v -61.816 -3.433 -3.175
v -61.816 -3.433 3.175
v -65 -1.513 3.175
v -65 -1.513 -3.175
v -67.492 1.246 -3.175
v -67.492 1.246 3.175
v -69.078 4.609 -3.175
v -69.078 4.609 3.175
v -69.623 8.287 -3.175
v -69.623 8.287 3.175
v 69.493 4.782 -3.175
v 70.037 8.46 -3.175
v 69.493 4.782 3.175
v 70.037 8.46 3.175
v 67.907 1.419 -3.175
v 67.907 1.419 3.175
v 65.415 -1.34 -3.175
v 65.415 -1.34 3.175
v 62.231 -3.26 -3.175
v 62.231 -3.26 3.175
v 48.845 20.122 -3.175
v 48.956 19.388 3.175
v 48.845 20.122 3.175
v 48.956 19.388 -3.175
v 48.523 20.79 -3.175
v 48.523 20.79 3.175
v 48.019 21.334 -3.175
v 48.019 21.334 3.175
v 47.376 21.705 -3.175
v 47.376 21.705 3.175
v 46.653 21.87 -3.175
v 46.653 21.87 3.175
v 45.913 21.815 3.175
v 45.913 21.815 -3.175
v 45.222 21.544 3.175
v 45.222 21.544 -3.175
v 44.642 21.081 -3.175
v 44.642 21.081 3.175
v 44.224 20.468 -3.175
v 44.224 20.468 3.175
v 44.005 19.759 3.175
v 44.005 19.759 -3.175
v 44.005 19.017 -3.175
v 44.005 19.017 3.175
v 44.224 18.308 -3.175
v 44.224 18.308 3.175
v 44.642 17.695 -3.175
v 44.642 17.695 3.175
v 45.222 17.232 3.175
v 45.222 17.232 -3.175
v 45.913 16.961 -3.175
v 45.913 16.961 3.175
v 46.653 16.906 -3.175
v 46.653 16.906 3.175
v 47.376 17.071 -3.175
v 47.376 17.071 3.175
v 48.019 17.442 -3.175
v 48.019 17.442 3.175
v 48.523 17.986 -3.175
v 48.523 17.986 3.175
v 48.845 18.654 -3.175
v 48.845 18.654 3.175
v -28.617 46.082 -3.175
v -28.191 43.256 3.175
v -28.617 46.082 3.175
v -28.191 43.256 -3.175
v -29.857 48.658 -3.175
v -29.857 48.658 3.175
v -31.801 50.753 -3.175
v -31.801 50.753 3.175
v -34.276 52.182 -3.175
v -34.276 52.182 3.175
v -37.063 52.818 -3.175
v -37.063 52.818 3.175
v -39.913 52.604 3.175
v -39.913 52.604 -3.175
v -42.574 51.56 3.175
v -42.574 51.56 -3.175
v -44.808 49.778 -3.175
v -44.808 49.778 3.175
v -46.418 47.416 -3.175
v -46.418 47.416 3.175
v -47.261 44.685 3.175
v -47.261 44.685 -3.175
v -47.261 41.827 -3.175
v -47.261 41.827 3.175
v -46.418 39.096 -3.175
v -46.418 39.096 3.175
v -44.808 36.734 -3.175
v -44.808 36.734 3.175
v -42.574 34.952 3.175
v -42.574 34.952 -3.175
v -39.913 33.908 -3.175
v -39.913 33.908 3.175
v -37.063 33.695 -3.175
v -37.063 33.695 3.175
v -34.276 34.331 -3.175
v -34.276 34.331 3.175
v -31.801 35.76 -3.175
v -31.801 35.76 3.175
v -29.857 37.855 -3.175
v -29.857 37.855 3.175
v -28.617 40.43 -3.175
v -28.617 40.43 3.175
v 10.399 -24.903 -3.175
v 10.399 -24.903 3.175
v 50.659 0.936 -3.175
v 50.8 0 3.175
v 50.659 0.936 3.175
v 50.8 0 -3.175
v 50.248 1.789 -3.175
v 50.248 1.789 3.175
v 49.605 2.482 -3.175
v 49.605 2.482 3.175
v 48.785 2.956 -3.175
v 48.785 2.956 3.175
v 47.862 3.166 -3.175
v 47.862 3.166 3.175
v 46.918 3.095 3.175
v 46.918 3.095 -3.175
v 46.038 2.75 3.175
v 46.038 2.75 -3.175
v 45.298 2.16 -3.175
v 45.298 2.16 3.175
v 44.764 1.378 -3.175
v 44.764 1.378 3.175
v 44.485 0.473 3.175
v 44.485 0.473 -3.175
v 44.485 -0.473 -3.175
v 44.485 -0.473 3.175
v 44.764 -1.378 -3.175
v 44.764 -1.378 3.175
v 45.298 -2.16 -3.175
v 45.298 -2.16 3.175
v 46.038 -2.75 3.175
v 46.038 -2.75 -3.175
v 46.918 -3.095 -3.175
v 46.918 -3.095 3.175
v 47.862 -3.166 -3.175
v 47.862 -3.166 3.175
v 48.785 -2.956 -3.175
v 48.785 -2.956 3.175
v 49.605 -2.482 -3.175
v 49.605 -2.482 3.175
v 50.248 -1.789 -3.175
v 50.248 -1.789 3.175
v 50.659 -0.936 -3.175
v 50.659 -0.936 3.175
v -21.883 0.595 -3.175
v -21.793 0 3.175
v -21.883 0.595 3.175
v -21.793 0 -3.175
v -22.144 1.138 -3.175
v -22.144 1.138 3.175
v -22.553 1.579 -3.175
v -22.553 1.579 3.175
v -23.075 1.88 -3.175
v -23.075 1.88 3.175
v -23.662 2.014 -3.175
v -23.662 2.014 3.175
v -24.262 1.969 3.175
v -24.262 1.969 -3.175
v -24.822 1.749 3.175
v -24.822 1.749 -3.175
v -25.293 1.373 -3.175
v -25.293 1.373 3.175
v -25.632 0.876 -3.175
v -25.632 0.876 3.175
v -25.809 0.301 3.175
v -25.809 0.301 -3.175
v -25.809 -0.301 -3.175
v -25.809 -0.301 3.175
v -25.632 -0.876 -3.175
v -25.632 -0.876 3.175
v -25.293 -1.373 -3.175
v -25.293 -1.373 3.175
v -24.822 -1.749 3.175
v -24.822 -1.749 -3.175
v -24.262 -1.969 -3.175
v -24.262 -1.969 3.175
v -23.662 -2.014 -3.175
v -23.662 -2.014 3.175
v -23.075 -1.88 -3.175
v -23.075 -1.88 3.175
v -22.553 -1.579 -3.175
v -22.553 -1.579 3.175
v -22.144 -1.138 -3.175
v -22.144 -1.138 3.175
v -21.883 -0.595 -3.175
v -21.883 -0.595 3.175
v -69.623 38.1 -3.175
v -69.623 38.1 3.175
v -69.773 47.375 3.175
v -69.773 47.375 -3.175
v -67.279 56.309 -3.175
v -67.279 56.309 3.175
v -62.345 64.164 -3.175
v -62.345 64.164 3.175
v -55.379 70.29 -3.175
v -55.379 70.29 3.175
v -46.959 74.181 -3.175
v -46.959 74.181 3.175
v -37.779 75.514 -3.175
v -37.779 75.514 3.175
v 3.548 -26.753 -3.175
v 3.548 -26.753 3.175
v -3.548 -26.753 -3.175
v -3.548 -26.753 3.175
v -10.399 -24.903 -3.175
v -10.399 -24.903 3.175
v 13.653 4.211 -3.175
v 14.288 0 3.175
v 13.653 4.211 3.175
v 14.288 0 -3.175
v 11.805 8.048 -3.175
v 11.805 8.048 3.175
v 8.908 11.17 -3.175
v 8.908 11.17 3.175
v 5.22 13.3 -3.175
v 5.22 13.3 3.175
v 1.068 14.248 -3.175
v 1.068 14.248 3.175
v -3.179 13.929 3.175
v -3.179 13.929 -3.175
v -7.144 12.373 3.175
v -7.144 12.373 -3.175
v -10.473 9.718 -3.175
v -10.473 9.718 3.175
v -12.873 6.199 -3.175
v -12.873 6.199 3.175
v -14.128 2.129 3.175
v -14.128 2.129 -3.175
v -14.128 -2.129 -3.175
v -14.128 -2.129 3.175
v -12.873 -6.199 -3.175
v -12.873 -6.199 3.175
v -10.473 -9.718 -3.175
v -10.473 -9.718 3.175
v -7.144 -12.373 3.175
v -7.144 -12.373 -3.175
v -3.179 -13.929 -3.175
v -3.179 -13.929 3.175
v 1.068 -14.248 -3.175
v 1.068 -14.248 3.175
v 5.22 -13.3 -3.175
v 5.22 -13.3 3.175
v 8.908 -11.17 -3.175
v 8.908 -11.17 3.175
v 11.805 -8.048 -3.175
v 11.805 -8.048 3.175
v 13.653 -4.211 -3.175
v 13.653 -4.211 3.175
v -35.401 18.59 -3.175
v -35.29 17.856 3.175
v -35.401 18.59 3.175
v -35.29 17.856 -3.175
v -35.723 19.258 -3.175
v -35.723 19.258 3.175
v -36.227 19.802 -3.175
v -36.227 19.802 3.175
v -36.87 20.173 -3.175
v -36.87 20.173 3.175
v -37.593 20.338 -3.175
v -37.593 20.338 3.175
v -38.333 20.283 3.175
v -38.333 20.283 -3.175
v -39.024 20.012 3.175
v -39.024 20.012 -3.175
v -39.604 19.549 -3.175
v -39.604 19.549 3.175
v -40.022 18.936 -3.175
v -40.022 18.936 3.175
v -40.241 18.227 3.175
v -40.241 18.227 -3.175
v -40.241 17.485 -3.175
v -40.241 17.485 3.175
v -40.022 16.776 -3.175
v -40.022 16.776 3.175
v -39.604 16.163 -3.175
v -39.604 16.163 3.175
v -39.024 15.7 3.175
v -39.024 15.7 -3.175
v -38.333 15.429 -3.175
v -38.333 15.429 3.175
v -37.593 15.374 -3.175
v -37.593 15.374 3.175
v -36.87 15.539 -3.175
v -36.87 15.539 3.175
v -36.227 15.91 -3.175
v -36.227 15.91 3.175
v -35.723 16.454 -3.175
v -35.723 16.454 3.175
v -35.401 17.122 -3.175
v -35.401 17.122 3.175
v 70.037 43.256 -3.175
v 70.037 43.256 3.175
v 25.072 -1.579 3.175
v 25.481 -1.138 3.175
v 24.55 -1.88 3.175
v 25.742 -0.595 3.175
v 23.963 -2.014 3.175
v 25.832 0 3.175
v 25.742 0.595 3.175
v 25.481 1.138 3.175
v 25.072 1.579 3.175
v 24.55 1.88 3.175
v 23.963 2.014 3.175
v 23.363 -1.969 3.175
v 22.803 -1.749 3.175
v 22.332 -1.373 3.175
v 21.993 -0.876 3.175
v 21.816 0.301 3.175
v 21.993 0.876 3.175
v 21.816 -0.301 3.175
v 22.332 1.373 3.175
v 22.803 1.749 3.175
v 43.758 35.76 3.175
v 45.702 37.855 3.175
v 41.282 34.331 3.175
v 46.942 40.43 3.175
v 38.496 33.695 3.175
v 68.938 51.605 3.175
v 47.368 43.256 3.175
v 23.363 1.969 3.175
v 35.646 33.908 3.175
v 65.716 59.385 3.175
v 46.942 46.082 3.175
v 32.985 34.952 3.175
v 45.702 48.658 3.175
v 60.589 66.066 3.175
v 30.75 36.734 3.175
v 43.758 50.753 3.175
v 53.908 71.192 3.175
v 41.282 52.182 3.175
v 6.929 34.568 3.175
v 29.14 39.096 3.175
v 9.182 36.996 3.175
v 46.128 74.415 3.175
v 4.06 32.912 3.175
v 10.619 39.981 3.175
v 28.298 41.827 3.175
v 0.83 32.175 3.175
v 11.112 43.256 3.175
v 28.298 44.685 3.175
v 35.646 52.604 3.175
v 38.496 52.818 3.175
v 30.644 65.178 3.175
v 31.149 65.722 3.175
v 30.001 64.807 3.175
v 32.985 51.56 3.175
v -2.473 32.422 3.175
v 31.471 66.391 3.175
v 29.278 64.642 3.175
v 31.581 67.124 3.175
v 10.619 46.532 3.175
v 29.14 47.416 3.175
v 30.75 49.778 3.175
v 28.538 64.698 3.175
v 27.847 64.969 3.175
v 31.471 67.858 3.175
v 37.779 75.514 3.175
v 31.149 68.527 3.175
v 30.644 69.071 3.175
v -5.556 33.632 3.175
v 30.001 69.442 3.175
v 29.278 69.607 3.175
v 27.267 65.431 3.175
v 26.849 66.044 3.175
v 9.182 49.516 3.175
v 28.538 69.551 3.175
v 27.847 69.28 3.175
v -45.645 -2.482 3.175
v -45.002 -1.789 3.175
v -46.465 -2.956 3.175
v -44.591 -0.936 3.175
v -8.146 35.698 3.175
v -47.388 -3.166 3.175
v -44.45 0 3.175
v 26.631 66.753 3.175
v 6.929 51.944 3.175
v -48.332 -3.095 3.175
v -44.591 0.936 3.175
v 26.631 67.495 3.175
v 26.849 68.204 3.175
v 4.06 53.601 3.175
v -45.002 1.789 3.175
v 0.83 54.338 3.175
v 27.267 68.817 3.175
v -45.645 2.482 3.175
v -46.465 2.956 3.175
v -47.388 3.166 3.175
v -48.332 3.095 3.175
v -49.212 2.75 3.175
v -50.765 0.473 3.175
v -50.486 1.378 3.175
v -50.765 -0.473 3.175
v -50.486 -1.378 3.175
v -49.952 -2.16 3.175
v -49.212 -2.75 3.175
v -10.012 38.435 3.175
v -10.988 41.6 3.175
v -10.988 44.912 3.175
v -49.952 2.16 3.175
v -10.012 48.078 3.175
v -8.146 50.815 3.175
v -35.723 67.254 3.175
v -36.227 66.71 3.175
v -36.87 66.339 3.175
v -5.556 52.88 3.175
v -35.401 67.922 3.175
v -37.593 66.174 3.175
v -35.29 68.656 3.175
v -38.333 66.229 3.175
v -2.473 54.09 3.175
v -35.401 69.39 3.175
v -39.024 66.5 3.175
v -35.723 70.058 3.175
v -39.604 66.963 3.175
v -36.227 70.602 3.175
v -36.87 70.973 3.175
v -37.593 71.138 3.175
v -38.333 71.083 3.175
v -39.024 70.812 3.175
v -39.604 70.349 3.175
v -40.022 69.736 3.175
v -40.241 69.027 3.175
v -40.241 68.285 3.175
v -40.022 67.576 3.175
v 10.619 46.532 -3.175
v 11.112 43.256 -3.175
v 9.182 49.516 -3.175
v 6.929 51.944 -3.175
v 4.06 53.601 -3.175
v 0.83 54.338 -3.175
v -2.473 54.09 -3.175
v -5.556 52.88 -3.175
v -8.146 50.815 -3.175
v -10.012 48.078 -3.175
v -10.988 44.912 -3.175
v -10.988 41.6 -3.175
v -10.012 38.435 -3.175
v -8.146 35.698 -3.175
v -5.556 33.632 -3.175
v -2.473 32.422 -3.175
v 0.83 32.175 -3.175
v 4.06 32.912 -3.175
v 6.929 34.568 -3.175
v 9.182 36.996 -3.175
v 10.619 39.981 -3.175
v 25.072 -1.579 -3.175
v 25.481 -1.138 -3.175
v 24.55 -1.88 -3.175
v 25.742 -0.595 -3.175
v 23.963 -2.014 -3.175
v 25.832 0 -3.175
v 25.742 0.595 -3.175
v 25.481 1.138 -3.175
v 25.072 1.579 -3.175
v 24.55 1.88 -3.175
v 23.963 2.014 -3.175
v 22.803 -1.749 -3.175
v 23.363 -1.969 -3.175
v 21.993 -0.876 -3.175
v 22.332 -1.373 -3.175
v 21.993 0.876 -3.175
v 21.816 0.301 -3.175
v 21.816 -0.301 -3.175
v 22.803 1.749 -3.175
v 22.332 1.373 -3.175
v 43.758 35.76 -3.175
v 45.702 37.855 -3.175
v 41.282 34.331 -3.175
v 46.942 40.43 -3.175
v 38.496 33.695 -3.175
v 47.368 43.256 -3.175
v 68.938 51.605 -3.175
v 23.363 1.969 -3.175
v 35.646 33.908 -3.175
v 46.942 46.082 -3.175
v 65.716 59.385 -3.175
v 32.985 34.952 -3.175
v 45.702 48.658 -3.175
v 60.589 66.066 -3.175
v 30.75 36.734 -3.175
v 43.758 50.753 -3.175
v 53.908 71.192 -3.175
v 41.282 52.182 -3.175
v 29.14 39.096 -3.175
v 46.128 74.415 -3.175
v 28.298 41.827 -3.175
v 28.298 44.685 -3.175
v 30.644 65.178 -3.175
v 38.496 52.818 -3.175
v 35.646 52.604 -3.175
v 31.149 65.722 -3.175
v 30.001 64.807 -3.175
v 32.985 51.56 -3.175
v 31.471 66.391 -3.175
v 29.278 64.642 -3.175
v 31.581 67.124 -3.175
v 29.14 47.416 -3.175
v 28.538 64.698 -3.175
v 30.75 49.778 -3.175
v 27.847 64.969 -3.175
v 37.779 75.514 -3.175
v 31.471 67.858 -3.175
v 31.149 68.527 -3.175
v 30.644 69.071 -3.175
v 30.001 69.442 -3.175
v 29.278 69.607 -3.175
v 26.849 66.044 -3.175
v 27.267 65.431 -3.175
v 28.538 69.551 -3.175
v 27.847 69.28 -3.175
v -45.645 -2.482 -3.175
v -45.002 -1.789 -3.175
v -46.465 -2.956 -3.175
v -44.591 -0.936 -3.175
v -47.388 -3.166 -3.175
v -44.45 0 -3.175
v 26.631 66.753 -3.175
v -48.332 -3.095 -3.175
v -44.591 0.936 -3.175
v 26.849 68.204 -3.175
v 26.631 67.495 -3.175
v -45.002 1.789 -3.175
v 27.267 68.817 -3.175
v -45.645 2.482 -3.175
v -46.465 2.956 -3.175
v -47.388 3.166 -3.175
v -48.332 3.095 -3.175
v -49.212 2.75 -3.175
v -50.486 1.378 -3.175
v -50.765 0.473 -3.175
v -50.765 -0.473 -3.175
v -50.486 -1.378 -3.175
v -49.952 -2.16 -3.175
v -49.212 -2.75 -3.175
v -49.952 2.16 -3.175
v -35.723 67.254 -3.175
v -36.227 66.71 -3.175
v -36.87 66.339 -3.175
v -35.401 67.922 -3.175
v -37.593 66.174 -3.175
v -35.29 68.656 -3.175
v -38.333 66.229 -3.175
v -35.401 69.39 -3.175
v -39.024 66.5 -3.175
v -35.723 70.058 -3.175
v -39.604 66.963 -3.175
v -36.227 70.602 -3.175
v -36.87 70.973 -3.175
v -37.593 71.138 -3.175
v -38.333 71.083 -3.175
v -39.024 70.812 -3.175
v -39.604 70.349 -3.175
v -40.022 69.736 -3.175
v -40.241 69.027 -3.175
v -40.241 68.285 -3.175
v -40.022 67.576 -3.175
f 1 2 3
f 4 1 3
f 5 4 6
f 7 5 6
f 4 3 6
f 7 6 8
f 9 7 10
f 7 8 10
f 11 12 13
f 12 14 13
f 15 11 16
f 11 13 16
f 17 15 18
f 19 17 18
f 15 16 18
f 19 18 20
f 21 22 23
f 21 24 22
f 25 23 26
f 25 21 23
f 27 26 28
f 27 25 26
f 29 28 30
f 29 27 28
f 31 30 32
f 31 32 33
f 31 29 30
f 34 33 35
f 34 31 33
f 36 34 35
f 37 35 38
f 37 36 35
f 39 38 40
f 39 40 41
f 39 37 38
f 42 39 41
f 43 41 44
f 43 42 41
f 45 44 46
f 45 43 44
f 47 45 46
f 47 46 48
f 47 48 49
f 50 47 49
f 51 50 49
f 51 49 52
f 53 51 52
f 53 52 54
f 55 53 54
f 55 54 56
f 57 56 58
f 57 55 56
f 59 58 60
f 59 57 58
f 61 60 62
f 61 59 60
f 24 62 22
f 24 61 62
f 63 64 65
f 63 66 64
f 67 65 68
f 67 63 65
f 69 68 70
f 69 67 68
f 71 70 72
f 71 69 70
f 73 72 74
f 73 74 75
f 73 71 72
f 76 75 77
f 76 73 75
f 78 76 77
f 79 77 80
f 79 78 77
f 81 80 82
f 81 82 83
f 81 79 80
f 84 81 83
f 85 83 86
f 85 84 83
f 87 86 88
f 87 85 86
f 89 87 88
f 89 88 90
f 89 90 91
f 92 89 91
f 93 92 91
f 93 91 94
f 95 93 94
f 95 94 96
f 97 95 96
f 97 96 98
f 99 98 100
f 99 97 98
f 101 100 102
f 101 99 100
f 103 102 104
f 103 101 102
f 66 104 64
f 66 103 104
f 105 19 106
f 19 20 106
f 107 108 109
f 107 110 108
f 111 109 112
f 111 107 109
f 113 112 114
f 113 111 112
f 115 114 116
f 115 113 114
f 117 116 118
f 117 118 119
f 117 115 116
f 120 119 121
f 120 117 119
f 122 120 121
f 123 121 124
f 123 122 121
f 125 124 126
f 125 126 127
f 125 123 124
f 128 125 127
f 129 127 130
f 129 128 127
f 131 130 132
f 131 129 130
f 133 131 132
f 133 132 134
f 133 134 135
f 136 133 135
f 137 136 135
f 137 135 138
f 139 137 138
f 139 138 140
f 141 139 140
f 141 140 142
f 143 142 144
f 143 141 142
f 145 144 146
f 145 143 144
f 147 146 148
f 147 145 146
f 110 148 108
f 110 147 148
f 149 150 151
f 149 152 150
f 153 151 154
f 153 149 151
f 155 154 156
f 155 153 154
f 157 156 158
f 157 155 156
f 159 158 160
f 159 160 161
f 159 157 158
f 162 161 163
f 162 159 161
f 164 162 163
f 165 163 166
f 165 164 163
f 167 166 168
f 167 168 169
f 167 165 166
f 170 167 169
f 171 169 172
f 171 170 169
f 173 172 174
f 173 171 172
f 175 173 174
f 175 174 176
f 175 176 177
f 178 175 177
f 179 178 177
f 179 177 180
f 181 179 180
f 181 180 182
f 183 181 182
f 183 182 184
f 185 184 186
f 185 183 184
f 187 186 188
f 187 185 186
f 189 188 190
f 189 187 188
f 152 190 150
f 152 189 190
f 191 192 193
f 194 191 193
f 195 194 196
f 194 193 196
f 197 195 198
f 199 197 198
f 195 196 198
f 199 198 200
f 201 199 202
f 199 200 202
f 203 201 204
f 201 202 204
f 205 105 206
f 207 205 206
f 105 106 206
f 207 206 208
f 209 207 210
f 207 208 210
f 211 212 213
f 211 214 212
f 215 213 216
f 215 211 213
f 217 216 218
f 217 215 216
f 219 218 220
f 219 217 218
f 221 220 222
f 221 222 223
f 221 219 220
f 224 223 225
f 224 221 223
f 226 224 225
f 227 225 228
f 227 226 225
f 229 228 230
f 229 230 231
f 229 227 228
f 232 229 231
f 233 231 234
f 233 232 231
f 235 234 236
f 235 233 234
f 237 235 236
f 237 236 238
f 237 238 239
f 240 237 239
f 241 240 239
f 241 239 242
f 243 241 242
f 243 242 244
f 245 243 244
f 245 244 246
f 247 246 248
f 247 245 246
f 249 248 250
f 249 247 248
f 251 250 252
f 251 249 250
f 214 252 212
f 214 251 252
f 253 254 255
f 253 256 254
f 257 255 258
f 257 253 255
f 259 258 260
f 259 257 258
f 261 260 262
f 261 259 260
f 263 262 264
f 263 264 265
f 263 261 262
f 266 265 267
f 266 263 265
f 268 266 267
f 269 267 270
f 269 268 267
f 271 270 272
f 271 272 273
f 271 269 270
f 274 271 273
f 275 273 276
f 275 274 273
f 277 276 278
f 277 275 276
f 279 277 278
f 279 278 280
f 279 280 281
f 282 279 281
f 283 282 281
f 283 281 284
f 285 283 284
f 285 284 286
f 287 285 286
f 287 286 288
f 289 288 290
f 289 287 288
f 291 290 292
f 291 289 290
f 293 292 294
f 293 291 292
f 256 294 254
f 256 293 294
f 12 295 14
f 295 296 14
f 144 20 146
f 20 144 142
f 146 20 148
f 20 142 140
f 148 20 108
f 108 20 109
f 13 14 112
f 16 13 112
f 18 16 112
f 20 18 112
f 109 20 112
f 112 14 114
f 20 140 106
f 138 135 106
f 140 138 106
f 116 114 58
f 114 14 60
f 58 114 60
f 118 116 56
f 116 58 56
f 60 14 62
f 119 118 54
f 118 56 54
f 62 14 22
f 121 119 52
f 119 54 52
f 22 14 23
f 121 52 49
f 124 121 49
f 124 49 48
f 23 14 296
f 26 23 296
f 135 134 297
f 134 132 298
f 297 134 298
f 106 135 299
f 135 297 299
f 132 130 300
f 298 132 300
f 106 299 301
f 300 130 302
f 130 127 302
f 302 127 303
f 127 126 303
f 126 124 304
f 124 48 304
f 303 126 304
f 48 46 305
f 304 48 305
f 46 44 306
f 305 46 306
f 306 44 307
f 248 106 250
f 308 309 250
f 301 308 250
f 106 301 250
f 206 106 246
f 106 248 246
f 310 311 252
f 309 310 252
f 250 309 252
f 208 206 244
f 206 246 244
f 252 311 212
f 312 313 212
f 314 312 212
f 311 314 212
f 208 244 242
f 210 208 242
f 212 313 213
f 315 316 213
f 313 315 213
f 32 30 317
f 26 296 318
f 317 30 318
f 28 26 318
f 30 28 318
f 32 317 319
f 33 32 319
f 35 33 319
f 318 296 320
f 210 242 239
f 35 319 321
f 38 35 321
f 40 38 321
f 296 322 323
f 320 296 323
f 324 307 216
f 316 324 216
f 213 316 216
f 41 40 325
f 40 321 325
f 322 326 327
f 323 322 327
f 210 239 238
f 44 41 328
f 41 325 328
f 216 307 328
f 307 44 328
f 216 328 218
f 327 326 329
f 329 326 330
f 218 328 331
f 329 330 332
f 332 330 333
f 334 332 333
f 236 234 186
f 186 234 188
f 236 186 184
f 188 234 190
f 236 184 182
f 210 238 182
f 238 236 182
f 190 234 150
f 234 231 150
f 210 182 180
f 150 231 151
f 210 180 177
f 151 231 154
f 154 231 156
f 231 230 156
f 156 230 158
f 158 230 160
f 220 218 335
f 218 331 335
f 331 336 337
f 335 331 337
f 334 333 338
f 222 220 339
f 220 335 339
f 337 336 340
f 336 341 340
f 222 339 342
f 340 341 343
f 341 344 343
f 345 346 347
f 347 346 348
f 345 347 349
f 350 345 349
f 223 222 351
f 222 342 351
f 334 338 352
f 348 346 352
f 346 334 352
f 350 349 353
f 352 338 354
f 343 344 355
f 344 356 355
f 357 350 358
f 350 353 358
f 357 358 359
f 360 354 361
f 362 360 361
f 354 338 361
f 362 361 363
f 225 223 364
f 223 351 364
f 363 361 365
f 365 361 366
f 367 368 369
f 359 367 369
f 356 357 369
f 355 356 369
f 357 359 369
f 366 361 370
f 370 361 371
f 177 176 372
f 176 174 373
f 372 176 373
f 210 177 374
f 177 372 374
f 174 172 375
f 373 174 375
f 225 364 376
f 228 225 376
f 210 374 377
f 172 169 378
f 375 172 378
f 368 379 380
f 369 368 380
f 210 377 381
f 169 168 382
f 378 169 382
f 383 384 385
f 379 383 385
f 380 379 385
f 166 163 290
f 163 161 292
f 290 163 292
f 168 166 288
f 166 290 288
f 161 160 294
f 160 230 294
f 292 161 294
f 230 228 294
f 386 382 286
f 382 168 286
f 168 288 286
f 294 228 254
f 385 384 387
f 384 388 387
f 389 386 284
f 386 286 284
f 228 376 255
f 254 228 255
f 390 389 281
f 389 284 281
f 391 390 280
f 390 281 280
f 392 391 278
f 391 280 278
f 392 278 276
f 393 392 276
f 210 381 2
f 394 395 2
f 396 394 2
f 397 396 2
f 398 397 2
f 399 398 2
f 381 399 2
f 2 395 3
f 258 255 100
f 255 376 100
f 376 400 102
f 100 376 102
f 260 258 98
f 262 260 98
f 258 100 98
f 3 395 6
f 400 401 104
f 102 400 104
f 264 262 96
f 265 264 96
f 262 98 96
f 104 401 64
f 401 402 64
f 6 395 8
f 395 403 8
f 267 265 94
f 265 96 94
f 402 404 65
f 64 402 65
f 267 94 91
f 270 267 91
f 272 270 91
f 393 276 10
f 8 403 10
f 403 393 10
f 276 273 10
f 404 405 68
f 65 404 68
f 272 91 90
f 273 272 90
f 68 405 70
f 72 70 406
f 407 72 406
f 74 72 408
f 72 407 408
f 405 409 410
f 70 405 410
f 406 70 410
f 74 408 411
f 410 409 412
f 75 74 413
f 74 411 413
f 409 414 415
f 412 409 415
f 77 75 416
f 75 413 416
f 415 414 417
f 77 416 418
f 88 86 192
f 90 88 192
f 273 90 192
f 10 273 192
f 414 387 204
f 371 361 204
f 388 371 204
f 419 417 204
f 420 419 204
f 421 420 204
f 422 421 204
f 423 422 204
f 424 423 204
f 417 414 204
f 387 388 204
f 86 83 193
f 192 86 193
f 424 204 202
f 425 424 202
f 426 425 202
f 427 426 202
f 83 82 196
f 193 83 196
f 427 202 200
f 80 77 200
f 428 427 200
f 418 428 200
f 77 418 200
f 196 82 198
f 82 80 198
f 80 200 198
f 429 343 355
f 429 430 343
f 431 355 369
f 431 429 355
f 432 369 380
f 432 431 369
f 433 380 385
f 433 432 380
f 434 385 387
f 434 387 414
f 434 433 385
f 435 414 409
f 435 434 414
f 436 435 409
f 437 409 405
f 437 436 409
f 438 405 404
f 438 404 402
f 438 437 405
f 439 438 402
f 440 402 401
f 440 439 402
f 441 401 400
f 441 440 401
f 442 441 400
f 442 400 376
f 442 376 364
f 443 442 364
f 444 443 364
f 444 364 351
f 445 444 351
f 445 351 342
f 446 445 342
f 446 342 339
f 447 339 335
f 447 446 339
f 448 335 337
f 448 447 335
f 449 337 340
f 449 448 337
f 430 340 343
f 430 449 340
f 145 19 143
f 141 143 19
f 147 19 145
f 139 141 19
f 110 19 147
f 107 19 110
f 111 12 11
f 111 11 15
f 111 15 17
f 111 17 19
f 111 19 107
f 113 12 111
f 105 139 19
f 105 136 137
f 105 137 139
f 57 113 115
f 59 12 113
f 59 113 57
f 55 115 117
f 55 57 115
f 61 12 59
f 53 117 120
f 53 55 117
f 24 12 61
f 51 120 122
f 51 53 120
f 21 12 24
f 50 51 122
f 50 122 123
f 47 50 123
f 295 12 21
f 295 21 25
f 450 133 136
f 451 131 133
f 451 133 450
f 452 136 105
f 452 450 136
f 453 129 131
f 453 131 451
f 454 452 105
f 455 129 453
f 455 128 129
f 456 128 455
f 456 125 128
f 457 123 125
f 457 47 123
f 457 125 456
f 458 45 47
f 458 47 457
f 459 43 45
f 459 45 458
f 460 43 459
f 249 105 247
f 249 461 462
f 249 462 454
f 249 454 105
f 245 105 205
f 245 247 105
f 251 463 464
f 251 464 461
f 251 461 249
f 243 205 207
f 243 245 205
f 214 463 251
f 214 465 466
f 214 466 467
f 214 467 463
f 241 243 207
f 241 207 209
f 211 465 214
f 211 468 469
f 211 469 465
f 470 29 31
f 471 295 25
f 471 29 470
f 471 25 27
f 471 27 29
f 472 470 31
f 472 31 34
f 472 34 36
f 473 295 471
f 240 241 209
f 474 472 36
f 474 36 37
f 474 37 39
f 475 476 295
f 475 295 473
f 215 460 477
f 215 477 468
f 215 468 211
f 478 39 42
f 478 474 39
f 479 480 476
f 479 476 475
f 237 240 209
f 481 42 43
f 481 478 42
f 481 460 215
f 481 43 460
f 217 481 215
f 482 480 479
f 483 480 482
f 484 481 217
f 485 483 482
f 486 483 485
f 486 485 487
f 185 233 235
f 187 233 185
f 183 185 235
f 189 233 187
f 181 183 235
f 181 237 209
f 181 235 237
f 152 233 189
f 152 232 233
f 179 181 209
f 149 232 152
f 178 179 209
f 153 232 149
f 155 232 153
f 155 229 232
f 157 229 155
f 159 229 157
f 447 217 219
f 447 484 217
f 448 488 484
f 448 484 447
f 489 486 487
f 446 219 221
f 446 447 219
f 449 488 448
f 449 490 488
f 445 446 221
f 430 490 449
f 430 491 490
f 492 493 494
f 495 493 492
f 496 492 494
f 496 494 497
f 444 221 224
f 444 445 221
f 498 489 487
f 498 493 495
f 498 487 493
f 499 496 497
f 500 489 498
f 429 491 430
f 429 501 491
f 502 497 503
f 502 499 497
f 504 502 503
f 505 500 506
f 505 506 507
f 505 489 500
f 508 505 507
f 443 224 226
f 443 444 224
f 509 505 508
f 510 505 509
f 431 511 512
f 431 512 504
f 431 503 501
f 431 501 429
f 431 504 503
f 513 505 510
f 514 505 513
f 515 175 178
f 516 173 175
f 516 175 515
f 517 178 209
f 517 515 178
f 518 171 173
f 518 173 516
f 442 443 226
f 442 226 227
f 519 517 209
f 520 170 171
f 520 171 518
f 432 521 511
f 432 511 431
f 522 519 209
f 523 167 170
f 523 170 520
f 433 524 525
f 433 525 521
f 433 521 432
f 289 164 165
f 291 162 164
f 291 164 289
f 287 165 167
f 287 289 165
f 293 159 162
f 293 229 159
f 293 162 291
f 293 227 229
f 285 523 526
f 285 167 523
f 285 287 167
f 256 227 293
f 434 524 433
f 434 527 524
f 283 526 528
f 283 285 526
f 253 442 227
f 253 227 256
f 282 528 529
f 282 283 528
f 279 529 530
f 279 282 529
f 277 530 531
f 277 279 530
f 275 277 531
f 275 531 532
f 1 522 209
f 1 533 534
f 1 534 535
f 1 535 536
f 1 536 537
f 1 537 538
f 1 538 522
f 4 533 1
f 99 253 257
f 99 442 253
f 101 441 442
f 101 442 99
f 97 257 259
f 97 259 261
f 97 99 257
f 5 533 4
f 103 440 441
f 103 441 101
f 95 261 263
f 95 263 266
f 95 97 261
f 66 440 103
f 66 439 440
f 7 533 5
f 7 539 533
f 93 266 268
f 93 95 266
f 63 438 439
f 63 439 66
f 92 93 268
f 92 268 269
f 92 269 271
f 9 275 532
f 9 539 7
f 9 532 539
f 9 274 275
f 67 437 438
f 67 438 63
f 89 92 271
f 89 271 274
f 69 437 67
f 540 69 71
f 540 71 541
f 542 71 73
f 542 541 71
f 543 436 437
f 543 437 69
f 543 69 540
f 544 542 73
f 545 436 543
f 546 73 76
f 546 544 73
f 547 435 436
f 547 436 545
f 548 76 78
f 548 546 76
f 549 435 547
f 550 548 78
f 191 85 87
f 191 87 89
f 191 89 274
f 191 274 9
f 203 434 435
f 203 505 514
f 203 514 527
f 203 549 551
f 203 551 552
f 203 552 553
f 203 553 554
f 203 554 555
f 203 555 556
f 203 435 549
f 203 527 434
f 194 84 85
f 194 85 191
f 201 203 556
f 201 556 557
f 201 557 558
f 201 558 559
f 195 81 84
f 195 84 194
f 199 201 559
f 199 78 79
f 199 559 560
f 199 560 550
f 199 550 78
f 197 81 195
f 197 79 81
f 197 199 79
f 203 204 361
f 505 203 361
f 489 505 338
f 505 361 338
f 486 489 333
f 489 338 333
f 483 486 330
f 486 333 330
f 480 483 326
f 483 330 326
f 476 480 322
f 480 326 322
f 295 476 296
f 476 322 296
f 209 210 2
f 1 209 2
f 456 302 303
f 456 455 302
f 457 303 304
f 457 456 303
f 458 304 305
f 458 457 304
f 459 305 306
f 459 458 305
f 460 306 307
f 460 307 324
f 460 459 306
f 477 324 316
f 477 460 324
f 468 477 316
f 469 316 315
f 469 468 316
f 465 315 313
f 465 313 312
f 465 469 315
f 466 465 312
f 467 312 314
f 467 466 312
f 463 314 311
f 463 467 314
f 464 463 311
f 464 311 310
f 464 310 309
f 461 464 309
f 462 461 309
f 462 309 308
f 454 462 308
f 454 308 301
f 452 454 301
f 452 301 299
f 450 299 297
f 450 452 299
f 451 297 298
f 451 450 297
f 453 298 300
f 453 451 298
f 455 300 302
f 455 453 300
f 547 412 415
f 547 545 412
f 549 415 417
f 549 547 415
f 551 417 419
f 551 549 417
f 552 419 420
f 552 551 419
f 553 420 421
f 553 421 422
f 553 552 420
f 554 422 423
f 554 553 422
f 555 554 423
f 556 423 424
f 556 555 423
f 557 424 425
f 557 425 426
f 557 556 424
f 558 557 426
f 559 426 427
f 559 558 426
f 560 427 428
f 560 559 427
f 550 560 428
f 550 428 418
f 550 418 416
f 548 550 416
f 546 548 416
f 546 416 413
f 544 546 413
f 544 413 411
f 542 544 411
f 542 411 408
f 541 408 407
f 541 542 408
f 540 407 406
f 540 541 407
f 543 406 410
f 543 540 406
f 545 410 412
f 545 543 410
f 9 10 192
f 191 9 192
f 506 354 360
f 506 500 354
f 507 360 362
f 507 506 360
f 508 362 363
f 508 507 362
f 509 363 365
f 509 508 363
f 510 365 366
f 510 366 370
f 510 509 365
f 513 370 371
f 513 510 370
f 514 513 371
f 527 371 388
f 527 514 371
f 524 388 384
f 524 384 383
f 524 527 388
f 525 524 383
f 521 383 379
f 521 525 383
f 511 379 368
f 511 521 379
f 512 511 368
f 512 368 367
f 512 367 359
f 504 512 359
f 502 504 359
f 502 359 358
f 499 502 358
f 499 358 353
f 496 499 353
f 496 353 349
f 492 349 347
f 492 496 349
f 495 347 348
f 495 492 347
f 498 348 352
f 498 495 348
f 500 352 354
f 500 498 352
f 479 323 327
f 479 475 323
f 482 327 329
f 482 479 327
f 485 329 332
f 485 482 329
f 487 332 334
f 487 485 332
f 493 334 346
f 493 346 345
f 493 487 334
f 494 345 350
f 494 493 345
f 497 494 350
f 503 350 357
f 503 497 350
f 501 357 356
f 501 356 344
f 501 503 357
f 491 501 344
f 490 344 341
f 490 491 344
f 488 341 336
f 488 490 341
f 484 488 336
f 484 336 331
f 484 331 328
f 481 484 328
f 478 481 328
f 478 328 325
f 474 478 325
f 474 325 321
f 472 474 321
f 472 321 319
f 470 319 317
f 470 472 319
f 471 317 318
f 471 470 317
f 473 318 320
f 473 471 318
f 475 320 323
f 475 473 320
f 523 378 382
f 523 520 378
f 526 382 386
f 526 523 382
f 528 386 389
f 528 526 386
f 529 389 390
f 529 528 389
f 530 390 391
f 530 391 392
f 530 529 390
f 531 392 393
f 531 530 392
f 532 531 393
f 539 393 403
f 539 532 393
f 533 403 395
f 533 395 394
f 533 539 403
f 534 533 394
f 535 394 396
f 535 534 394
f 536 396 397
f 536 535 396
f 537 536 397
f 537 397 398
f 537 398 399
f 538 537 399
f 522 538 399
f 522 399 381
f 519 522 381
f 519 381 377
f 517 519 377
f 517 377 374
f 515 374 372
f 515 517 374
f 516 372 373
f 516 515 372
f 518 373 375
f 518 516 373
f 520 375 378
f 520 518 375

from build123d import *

# Parameters (mm, degrees)
SKETCH1_R           = 14.2875
SKETCH1_R_2         = 9.5885
SKETCH1_R_3         = 11.1125
SKETCH1_R_4         = 3.175
SKETCH1_R_5         = 2.0193
SKETCH1_R_6         = 2.4892
BOSS_EXTRUDE1_DEPTH = 3.175


with BuildPart() as part:
    # Sketch1 → Boss-Extrude1 (new, symmetric)
    with BuildSketch(Plane.XY):
        with BuildLine():
            Line((-37.779325, 75.5142), (37.779325, 75.5142))
            ThreePointArc((37.779325, 75.5142), (60.589175548, 66.066050548), (70.037325, 43.2562))
            Line((70.037325, 43.2562), (70.037325, 8.459528855))
            ThreePointArc((70.037325, 8.459528855), (67.907089191, 1.418926257), (62.231012411, -3.259763936))
            Line((62.231012411, -3.259763936), (10.399085748, -24.903497181))
            ThreePointArc((10.399085748, -24.903497181), (-4.3461e-05, -26.9875), (-10.399165957, -24.903463688))
            Line((-10.399165957, -24.903463688), (-61.816293797, -3.432745712))
            ThreePointArc((-61.816293797, -3.432745712), (-67.49234417, 1.245945741), (-69.622568641, 8.286531317))
            Line((-69.622568641, 8.286531317), (-69.622568641, 38.1))
            ThreePointArc((-69.622568641, 38.1), (-62.344618237, 64.163732906), (-37.779325, 75.5142))
        make_face()
        Circle(SKETCH1_R, mode=Mode.SUBTRACT)
        with Locations((-37.779325, 43.2562)):
            Circle(SKETCH1_R_2, mode=Mode.SUBTRACT)
        with Locations((37.779325, 43.2562)):
            Circle(SKETCH1_R_2, mode=Mode.SUBTRACT)
        with Locations((0, 43.2562)):
            Circle(SKETCH1_R_3, mode=Mode.SUBTRACT)
        with Locations((-47.625, 0)):
            Circle(SKETCH1_R_4, mode=Mode.SUBTRACT)
        with Locations((47.625, 0)):
            Circle(SKETCH1_R_4, mode=Mode.SUBTRACT)
        with Locations((-23.8125, 0)):
            Circle(SKETCH1_R_5, mode=Mode.SUBTRACT)
        with Locations((23.8125, 0)):
            Circle(SKETCH1_R_5, mode=Mode.SUBTRACT)
        with Locations((-37.779325, 68.6562)):
            Circle(SKETCH1_R_6, mode=Mode.SUBTRACT)
        with Locations((-37.779325, 17.8562)):
            Circle(SKETCH1_R_6, mode=Mode.SUBTRACT)
        with Locations((46.46663664, 19.388007432)):
            Circle(SKETCH1_R_6, mode=Mode.SUBTRACT)
        with Locations((29.09201336, 67.124392568)):
            Circle(SKETCH1_R_6, mode=Mode.SUBTRACT)
    extrude(amount=BOSS_EXTRUDE1_DEPTH, both=True)


solid = part.part
